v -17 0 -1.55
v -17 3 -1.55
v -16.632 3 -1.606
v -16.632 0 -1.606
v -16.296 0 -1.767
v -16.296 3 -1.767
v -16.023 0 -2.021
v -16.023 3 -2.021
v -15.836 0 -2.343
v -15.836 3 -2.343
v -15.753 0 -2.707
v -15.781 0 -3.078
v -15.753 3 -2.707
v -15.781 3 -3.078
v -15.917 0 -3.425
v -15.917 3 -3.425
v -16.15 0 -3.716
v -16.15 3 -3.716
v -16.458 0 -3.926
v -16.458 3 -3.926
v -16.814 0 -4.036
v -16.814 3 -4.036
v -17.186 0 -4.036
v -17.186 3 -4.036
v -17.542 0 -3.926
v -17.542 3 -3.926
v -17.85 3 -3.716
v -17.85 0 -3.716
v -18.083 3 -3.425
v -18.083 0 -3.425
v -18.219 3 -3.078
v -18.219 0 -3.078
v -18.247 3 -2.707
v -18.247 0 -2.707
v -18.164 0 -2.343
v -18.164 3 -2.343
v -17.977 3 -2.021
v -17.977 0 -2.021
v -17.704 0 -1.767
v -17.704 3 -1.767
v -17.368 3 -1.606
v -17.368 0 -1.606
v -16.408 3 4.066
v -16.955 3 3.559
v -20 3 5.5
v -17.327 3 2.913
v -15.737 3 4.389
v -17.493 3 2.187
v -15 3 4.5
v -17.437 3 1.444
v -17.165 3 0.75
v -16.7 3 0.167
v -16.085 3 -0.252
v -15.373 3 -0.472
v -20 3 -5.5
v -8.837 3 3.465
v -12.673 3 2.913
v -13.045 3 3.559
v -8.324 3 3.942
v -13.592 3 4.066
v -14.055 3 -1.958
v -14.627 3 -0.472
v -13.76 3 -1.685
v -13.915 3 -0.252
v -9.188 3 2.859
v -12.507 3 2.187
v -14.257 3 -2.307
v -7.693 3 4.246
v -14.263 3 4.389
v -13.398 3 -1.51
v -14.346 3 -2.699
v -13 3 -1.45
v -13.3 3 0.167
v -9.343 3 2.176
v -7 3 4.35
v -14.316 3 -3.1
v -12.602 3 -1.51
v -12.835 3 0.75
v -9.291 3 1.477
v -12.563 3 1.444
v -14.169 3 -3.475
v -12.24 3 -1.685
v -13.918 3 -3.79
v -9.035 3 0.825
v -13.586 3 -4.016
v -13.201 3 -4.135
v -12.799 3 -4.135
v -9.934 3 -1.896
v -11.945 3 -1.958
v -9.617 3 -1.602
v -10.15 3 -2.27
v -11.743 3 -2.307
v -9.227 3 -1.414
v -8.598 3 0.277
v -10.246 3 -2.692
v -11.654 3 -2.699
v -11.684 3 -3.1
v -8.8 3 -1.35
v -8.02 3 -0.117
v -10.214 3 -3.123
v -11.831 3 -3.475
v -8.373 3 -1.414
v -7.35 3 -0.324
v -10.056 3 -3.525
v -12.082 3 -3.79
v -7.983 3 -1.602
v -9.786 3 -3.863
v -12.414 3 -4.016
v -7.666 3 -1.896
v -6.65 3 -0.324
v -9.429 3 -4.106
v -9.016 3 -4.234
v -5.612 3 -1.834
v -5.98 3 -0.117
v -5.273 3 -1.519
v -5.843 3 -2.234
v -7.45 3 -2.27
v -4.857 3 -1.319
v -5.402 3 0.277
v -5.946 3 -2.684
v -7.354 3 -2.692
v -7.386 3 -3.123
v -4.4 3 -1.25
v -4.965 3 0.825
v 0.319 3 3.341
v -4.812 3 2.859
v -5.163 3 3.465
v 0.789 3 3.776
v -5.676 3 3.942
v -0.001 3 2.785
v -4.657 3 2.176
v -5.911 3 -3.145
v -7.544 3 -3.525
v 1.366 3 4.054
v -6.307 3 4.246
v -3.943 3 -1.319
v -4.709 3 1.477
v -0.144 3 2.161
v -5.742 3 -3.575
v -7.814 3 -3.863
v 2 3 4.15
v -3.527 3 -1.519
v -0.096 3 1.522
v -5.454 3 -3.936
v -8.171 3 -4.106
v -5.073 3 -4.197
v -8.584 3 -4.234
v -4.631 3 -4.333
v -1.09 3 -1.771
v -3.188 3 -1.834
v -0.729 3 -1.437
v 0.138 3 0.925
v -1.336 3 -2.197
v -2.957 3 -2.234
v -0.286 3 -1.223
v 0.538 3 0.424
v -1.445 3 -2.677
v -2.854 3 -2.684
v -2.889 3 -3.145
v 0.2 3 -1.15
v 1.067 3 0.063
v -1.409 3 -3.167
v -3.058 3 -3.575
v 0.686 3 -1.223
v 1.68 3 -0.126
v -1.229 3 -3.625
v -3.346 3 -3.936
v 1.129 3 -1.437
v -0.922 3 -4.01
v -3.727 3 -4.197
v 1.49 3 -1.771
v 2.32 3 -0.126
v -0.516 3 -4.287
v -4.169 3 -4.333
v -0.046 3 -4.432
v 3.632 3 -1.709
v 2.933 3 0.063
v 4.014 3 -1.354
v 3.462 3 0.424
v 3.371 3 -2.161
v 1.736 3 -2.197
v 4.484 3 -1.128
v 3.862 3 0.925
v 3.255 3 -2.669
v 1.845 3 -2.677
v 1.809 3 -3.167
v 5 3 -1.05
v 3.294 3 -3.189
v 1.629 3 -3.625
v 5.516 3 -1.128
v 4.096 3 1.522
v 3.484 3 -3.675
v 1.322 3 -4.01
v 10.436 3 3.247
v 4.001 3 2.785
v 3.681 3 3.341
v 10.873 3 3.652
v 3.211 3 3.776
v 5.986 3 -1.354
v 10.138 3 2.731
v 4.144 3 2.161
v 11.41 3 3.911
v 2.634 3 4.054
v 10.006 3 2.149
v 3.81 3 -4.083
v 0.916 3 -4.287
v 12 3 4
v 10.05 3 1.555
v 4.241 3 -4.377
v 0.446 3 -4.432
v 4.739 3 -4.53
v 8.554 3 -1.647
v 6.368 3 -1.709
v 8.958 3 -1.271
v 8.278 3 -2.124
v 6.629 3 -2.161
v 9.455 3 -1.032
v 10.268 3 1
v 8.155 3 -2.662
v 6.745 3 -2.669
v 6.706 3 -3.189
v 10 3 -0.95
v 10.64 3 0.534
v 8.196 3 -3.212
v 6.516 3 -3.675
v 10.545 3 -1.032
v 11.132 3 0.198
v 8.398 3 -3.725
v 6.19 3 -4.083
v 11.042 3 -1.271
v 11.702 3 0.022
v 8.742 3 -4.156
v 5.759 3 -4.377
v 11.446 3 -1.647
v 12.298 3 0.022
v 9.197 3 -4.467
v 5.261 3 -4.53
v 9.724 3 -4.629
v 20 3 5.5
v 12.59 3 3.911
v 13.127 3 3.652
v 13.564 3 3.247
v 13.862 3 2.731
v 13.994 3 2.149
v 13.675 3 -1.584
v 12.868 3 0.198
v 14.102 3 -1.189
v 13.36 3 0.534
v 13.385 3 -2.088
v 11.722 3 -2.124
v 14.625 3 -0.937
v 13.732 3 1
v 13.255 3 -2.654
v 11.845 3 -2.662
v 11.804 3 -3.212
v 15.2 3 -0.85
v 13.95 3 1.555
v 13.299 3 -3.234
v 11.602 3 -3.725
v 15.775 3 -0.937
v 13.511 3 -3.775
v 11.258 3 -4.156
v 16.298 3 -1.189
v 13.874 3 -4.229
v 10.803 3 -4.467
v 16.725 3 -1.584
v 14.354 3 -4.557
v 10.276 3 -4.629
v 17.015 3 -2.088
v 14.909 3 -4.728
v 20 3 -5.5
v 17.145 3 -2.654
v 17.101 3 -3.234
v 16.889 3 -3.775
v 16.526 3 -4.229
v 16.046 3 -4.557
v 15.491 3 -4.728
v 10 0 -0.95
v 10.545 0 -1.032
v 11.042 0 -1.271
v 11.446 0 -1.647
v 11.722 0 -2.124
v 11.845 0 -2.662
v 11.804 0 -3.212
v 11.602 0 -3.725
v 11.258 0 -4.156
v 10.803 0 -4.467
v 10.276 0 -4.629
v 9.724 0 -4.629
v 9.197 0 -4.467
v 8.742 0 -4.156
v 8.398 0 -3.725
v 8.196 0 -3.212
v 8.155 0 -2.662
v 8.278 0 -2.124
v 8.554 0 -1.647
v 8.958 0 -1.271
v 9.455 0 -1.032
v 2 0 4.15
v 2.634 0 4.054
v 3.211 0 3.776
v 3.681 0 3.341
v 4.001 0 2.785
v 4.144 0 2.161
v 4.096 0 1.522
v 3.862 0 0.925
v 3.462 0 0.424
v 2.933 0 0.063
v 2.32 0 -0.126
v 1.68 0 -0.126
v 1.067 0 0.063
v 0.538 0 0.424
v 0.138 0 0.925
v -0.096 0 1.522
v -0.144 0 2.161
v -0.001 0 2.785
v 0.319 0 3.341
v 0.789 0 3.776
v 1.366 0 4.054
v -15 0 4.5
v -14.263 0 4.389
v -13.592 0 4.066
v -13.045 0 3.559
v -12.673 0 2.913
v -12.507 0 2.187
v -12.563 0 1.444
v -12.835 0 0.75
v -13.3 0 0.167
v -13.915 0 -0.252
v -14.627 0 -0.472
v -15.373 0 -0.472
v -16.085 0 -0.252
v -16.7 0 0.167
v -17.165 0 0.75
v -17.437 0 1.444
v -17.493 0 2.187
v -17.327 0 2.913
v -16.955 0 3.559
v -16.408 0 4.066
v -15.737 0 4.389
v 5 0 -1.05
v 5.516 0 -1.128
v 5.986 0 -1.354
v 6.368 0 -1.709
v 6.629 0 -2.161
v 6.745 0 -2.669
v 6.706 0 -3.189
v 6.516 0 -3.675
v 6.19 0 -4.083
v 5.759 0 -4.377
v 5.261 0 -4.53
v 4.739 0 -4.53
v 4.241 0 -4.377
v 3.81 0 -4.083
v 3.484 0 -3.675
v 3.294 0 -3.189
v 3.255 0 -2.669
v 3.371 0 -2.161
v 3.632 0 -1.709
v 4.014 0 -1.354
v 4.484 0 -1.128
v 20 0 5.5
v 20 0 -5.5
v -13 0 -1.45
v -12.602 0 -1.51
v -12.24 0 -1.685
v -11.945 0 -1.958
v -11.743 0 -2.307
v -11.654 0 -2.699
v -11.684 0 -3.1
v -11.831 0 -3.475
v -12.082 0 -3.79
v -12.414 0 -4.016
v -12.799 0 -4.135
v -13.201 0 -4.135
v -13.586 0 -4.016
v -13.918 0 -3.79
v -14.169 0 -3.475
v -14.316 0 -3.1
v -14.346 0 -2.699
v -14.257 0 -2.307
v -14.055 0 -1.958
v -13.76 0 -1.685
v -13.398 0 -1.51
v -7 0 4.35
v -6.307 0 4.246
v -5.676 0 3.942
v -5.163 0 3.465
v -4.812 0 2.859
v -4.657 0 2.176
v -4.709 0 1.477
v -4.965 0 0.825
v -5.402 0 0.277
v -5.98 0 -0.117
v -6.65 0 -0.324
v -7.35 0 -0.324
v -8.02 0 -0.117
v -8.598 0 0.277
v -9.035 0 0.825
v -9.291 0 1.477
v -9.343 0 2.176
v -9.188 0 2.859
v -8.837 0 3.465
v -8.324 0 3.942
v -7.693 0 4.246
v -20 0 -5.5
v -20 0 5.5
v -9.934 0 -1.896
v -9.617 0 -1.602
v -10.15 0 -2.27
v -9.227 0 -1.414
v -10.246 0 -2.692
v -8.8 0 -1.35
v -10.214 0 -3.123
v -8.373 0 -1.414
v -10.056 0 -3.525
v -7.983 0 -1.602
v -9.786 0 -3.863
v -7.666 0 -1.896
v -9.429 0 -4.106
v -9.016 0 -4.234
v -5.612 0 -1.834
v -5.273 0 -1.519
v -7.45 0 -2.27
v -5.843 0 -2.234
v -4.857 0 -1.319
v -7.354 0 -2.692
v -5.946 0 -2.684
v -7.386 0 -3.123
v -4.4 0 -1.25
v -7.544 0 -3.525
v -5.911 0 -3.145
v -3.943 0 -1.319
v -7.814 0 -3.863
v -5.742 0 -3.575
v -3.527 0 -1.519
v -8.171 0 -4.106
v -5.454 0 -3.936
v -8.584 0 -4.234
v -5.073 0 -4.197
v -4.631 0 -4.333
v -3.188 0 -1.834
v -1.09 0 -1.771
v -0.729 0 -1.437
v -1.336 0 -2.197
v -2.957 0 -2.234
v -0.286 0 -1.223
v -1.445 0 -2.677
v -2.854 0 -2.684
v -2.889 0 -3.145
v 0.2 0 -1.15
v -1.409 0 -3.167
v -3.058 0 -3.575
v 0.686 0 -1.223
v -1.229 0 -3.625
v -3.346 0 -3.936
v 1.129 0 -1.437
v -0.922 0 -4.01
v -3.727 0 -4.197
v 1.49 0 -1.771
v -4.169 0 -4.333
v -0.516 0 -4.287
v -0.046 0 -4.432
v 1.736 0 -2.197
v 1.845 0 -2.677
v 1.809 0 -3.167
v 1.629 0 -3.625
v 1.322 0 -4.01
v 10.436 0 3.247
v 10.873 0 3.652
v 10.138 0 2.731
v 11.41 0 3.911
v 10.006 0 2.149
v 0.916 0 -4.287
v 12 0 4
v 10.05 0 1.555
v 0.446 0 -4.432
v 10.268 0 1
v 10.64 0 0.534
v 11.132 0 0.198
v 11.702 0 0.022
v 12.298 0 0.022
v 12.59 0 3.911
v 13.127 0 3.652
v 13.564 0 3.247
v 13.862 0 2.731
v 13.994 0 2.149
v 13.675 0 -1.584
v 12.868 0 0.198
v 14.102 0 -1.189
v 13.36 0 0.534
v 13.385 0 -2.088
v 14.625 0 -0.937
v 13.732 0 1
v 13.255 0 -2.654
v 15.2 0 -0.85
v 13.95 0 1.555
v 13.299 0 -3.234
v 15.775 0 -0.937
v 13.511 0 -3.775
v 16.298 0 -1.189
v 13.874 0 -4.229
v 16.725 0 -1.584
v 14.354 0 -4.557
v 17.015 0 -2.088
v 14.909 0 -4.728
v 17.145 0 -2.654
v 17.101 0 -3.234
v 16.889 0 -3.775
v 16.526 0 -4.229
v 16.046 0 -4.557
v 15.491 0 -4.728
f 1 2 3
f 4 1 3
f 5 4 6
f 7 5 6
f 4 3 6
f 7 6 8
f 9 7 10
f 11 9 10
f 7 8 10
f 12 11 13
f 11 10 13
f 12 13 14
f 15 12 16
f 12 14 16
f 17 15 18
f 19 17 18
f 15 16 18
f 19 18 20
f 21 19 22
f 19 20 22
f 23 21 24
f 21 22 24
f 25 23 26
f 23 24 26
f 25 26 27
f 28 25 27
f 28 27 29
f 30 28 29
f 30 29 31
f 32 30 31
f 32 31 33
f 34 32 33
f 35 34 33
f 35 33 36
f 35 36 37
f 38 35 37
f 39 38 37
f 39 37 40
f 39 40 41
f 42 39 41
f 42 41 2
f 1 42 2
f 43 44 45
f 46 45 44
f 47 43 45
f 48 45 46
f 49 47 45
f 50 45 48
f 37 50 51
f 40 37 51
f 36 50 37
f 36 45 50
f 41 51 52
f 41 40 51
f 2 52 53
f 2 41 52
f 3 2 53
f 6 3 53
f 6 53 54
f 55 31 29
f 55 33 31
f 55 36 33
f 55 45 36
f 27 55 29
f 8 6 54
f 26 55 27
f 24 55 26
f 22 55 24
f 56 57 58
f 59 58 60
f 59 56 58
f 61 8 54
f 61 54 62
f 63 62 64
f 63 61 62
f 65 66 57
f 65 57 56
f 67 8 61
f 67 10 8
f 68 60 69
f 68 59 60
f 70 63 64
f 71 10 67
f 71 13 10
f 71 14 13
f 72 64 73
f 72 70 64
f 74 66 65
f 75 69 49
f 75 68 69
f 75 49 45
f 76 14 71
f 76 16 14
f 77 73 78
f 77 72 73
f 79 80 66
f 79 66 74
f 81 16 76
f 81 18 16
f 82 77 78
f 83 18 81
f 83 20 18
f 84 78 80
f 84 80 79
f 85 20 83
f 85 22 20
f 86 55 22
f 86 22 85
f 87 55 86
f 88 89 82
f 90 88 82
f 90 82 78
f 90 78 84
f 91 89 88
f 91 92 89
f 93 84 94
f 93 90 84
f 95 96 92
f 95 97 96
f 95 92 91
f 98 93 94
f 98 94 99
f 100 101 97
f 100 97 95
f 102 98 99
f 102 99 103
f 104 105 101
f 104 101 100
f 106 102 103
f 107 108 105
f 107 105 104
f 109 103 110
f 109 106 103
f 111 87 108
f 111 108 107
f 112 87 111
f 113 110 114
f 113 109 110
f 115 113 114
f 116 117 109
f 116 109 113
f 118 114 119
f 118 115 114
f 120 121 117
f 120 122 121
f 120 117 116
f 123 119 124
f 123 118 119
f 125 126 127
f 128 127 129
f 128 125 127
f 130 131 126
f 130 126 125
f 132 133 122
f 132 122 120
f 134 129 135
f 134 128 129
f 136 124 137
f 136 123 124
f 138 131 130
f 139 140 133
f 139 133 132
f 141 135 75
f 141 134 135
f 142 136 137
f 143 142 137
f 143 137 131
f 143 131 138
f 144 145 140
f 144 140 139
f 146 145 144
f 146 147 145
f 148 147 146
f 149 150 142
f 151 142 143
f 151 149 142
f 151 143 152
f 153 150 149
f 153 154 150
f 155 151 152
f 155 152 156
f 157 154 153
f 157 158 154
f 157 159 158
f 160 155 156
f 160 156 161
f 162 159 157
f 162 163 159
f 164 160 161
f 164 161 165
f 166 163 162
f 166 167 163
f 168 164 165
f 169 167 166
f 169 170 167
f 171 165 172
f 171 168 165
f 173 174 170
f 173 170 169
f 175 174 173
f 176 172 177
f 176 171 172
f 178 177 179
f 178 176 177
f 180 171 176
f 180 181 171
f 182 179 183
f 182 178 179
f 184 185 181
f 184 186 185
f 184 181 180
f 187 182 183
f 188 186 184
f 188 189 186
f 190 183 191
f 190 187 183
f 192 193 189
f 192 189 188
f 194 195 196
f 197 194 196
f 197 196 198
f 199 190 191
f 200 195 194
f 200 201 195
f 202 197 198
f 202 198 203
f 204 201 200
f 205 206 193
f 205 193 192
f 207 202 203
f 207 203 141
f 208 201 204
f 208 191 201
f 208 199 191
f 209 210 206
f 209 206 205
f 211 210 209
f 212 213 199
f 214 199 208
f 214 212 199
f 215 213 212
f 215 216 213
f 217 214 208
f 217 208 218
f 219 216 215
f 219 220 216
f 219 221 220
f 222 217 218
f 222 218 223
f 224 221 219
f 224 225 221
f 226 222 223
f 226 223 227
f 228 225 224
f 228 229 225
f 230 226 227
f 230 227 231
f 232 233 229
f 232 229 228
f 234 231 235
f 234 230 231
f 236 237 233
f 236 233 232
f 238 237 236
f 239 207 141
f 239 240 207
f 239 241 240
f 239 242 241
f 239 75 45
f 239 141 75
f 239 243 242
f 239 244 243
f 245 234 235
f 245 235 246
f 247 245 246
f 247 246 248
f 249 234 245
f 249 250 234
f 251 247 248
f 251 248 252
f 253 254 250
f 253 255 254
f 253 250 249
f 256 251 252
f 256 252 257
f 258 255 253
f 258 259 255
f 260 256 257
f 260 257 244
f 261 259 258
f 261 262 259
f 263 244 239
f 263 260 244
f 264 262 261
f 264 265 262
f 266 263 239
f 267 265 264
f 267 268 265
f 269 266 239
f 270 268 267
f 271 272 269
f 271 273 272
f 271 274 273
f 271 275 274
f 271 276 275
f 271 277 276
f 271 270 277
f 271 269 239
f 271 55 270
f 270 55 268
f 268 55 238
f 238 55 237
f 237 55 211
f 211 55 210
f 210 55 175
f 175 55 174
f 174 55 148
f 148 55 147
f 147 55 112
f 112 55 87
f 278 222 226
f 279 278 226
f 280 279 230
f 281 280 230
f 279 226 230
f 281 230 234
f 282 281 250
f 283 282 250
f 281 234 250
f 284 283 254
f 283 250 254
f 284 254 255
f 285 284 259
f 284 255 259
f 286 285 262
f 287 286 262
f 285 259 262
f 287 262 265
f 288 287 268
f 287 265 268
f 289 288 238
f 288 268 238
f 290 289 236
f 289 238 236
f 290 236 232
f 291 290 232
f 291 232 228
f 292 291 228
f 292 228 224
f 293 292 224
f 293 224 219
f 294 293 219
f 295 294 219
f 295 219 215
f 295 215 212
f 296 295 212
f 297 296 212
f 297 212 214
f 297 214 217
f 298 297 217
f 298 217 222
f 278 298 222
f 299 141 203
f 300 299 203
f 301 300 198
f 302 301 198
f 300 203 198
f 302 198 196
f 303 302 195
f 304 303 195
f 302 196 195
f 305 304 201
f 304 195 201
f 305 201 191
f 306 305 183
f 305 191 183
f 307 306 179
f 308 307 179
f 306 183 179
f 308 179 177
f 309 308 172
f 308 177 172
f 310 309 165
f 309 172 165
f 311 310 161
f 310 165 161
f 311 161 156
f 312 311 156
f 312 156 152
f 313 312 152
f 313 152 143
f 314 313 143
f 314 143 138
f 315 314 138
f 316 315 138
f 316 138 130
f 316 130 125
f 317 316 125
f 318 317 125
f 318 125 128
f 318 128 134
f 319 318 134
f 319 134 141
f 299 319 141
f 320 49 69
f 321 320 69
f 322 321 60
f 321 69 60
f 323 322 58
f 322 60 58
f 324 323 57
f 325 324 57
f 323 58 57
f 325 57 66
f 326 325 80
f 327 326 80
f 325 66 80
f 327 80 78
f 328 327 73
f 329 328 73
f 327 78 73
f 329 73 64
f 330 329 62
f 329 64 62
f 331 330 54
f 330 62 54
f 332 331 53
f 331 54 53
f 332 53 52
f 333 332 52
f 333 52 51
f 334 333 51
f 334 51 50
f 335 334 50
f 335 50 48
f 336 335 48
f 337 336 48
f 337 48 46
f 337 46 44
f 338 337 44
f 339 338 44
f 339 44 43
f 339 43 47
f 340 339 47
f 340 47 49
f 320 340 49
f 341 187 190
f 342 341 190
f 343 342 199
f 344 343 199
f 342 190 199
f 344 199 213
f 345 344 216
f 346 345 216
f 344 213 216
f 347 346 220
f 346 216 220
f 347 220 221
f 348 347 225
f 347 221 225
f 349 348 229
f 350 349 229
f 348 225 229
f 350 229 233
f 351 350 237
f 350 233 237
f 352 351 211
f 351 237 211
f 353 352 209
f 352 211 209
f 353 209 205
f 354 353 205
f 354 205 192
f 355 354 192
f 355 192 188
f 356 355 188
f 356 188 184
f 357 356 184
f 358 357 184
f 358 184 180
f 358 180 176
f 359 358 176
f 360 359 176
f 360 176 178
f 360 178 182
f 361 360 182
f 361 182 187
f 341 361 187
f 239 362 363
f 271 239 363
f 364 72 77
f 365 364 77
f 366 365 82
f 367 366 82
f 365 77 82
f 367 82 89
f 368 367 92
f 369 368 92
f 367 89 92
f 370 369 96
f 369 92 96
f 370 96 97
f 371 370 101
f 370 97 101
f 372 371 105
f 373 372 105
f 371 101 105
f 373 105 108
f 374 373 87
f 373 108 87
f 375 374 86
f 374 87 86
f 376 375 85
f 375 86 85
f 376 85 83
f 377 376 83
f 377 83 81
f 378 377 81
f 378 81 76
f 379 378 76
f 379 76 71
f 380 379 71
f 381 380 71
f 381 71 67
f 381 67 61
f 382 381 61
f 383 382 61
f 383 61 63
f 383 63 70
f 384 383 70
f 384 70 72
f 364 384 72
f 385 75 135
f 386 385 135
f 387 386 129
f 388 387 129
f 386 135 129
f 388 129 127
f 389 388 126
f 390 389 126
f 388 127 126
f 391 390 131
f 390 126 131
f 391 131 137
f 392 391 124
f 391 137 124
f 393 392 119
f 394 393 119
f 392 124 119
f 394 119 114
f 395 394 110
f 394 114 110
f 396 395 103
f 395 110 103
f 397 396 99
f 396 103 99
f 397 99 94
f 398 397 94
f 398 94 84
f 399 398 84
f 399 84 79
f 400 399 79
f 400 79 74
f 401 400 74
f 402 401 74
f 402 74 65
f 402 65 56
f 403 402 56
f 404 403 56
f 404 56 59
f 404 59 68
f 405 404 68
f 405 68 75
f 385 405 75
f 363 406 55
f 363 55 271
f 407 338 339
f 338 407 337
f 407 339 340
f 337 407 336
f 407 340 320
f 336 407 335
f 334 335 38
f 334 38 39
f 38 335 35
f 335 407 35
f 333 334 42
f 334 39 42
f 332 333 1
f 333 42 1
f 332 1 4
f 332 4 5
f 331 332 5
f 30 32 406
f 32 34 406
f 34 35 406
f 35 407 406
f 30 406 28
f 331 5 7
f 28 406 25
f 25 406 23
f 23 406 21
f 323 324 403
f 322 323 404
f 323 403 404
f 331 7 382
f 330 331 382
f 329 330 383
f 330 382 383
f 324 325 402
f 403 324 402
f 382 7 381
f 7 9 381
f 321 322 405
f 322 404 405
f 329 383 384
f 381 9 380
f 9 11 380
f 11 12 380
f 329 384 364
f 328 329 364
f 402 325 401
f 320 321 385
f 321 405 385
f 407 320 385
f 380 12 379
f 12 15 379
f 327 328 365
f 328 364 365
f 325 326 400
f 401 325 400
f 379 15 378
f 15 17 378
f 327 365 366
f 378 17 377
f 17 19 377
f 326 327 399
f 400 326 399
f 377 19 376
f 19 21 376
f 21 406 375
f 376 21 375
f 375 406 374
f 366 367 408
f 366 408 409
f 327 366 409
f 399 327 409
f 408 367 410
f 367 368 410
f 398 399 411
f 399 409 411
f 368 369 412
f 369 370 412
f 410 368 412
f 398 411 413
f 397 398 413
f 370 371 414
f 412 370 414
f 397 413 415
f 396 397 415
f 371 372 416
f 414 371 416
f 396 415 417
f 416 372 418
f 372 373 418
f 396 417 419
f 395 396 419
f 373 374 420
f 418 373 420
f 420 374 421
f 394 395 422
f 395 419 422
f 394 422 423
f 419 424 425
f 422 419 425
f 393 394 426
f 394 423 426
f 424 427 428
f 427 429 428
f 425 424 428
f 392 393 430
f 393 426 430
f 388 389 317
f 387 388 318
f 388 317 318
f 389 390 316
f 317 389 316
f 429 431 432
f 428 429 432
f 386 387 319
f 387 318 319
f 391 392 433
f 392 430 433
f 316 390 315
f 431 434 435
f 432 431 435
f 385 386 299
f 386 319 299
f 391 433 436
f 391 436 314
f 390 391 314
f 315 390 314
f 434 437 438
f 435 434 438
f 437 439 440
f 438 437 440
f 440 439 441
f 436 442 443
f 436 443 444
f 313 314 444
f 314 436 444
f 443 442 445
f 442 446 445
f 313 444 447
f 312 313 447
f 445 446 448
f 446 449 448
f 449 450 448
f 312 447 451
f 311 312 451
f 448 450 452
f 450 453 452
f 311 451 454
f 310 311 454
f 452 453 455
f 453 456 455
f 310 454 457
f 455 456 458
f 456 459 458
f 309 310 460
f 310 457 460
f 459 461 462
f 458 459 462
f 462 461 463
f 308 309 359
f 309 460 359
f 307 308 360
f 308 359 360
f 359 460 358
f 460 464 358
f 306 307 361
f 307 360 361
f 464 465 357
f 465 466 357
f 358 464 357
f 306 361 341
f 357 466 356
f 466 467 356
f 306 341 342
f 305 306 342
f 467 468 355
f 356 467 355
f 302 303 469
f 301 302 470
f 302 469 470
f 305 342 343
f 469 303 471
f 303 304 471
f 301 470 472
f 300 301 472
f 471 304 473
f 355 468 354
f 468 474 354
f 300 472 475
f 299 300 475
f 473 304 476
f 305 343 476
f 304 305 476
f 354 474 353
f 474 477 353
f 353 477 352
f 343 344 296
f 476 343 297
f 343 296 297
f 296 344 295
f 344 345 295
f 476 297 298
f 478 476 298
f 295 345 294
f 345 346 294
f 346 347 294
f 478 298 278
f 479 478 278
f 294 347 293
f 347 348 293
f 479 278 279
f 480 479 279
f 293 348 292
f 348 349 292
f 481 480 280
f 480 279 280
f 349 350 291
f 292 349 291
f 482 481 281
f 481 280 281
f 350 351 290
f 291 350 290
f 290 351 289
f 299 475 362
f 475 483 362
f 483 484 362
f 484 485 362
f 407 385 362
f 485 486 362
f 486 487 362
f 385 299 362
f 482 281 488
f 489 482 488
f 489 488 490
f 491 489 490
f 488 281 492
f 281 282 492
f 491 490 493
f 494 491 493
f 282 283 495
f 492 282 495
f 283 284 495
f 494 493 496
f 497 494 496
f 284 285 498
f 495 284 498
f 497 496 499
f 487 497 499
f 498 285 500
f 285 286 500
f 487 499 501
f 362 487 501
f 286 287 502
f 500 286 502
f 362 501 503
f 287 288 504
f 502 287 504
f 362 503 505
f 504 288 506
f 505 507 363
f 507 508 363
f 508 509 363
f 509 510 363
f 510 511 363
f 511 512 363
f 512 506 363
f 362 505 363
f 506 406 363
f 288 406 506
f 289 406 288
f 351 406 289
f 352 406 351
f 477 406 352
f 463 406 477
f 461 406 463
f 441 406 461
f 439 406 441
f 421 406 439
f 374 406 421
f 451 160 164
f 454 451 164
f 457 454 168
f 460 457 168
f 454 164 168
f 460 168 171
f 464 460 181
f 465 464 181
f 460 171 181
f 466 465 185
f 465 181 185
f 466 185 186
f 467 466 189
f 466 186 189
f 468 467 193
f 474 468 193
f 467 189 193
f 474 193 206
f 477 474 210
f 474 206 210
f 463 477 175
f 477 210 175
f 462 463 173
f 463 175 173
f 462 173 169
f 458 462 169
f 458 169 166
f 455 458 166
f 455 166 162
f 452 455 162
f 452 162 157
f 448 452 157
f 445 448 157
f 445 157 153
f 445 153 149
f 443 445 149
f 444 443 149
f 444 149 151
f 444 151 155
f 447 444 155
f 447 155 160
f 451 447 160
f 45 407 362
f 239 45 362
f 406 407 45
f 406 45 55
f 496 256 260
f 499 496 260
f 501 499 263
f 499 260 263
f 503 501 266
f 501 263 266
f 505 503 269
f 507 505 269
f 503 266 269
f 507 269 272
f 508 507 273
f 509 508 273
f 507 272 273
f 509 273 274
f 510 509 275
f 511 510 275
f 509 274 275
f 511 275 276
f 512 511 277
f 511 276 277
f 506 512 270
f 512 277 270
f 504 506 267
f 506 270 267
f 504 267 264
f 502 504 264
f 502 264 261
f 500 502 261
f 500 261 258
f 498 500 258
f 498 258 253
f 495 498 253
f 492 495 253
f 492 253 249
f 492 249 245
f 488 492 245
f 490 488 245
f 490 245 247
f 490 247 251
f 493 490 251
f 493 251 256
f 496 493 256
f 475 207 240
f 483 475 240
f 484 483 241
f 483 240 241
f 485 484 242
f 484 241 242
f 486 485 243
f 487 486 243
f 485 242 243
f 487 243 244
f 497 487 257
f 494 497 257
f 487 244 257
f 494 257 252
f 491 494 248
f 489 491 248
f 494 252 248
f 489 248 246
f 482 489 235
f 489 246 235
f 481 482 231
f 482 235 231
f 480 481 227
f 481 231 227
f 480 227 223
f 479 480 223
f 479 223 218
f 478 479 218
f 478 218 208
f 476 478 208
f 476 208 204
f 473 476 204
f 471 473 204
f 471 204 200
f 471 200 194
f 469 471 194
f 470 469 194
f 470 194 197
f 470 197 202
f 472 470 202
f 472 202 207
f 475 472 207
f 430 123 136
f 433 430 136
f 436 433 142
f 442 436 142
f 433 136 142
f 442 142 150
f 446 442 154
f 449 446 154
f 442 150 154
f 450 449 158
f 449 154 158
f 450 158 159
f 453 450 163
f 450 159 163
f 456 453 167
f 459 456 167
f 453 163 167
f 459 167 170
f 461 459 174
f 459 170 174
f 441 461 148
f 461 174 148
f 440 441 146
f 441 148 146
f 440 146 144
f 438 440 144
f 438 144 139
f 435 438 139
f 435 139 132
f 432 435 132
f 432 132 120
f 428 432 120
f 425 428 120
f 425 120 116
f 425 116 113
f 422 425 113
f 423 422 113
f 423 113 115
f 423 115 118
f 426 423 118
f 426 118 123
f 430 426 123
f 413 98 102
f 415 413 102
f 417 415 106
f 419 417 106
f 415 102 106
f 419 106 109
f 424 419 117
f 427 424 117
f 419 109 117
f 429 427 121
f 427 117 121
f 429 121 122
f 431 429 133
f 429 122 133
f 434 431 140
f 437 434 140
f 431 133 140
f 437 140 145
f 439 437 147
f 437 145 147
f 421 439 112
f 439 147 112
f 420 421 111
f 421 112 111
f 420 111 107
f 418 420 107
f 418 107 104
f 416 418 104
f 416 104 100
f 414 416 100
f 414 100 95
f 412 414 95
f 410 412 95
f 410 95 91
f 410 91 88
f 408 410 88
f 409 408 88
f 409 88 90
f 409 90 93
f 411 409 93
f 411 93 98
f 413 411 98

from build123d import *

# Parameters (mm, degrees)
SKETCH1_W           = 40
SKETCH1_H           = 11
BOSS_EXTRUDE1_DEPTH = 3
SKETCH2_R           = 1.25
SKETCH2_R_2         = 1.35
SKETCH2_R_3         = 1.45
SKETCH2_R_4         = 1.55
SKETCH2_R_5         = 1.65
SKETCH2_R_6         = 1.75
SKETCH2_R_7         = 1.85
SKETCH2_R_8         = 1.95
SKETCH2_R_9         = 2.15
SKETCH2_R_10        = 2
SKETCH2_R_11        = 2.5
SKETCH2_R_12        = 2.35
CUT_EXTRUDE1_DEPTH  = 21.958291915


with BuildPart() as part:
    # Sketch1 → Boss-Extrude1 (new body)
    with BuildSketch(Plane(origin=(0, 0, 0), x_dir=(1, 0, 0), z_dir=(0, 1, 0))):
        Rectangle(SKETCH1_W, SKETCH1_H)
    extrude(amount=BOSS_EXTRUDE1_DEPTH)

    # Sketch2 → Cut-Extrude1 (cut, through all)
    with BuildSketch(Plane(origin=(0, 3, 0), x_dir=(1, 0, 0), z_dir=(0, 1, 0))):
        with Locations(Location((-17, 2.8, 0), (0, 0, 270))):
            Circle(SKETCH2_R)
        with Locations(Location((-13, 2.8, 0), (0, 0, 270))):
            Circle(SKETCH2_R_2)
        with Locations(Location((-8.8, 2.8, 0), (0, 0, 270))):
            Circle(SKETCH2_R_3)
        with Locations(Location((-4.4, 2.8, 0), (0, 0, 270))):
            Circle(SKETCH2_R_4)
        with Locations(Location((0.2, 2.8, 0), (0, 0, 270))):
            Circle(SKETCH2_R_5)
        with Locations(Location((5, 2.8, 0), (0, 0, 270))):
            Circle(SKETCH2_R_6)
        with Locations(Location((10, 2.8, 0), (0, 0, 270))):
            Circle(SKETCH2_R_7)
        with Locations(Location((15.2, 2.8, 0), (0, 0, 270))):
            Circle(SKETCH2_R_8)
        with Locations(Location((2, -2, 0), (0, 0, 270))):
            Circle(SKETCH2_R_9)
        with Locations(Location((12, -2, 0), (0, 0, 270))):
            Circle(SKETCH2_R_10)
        with Locations(Location((-15, -2, 0), (0, 0, 270))):
            Circle(SKETCH2_R_11)
        with Locations(Location((-7, -2, 0), (0, 0, 270))):
            Circle(SKETCH2_R_12)
    extrude(amount=-CUT_EXTRUDE1_DEPTH, mode=Mode.SUBTRACT)


solid = part.part
